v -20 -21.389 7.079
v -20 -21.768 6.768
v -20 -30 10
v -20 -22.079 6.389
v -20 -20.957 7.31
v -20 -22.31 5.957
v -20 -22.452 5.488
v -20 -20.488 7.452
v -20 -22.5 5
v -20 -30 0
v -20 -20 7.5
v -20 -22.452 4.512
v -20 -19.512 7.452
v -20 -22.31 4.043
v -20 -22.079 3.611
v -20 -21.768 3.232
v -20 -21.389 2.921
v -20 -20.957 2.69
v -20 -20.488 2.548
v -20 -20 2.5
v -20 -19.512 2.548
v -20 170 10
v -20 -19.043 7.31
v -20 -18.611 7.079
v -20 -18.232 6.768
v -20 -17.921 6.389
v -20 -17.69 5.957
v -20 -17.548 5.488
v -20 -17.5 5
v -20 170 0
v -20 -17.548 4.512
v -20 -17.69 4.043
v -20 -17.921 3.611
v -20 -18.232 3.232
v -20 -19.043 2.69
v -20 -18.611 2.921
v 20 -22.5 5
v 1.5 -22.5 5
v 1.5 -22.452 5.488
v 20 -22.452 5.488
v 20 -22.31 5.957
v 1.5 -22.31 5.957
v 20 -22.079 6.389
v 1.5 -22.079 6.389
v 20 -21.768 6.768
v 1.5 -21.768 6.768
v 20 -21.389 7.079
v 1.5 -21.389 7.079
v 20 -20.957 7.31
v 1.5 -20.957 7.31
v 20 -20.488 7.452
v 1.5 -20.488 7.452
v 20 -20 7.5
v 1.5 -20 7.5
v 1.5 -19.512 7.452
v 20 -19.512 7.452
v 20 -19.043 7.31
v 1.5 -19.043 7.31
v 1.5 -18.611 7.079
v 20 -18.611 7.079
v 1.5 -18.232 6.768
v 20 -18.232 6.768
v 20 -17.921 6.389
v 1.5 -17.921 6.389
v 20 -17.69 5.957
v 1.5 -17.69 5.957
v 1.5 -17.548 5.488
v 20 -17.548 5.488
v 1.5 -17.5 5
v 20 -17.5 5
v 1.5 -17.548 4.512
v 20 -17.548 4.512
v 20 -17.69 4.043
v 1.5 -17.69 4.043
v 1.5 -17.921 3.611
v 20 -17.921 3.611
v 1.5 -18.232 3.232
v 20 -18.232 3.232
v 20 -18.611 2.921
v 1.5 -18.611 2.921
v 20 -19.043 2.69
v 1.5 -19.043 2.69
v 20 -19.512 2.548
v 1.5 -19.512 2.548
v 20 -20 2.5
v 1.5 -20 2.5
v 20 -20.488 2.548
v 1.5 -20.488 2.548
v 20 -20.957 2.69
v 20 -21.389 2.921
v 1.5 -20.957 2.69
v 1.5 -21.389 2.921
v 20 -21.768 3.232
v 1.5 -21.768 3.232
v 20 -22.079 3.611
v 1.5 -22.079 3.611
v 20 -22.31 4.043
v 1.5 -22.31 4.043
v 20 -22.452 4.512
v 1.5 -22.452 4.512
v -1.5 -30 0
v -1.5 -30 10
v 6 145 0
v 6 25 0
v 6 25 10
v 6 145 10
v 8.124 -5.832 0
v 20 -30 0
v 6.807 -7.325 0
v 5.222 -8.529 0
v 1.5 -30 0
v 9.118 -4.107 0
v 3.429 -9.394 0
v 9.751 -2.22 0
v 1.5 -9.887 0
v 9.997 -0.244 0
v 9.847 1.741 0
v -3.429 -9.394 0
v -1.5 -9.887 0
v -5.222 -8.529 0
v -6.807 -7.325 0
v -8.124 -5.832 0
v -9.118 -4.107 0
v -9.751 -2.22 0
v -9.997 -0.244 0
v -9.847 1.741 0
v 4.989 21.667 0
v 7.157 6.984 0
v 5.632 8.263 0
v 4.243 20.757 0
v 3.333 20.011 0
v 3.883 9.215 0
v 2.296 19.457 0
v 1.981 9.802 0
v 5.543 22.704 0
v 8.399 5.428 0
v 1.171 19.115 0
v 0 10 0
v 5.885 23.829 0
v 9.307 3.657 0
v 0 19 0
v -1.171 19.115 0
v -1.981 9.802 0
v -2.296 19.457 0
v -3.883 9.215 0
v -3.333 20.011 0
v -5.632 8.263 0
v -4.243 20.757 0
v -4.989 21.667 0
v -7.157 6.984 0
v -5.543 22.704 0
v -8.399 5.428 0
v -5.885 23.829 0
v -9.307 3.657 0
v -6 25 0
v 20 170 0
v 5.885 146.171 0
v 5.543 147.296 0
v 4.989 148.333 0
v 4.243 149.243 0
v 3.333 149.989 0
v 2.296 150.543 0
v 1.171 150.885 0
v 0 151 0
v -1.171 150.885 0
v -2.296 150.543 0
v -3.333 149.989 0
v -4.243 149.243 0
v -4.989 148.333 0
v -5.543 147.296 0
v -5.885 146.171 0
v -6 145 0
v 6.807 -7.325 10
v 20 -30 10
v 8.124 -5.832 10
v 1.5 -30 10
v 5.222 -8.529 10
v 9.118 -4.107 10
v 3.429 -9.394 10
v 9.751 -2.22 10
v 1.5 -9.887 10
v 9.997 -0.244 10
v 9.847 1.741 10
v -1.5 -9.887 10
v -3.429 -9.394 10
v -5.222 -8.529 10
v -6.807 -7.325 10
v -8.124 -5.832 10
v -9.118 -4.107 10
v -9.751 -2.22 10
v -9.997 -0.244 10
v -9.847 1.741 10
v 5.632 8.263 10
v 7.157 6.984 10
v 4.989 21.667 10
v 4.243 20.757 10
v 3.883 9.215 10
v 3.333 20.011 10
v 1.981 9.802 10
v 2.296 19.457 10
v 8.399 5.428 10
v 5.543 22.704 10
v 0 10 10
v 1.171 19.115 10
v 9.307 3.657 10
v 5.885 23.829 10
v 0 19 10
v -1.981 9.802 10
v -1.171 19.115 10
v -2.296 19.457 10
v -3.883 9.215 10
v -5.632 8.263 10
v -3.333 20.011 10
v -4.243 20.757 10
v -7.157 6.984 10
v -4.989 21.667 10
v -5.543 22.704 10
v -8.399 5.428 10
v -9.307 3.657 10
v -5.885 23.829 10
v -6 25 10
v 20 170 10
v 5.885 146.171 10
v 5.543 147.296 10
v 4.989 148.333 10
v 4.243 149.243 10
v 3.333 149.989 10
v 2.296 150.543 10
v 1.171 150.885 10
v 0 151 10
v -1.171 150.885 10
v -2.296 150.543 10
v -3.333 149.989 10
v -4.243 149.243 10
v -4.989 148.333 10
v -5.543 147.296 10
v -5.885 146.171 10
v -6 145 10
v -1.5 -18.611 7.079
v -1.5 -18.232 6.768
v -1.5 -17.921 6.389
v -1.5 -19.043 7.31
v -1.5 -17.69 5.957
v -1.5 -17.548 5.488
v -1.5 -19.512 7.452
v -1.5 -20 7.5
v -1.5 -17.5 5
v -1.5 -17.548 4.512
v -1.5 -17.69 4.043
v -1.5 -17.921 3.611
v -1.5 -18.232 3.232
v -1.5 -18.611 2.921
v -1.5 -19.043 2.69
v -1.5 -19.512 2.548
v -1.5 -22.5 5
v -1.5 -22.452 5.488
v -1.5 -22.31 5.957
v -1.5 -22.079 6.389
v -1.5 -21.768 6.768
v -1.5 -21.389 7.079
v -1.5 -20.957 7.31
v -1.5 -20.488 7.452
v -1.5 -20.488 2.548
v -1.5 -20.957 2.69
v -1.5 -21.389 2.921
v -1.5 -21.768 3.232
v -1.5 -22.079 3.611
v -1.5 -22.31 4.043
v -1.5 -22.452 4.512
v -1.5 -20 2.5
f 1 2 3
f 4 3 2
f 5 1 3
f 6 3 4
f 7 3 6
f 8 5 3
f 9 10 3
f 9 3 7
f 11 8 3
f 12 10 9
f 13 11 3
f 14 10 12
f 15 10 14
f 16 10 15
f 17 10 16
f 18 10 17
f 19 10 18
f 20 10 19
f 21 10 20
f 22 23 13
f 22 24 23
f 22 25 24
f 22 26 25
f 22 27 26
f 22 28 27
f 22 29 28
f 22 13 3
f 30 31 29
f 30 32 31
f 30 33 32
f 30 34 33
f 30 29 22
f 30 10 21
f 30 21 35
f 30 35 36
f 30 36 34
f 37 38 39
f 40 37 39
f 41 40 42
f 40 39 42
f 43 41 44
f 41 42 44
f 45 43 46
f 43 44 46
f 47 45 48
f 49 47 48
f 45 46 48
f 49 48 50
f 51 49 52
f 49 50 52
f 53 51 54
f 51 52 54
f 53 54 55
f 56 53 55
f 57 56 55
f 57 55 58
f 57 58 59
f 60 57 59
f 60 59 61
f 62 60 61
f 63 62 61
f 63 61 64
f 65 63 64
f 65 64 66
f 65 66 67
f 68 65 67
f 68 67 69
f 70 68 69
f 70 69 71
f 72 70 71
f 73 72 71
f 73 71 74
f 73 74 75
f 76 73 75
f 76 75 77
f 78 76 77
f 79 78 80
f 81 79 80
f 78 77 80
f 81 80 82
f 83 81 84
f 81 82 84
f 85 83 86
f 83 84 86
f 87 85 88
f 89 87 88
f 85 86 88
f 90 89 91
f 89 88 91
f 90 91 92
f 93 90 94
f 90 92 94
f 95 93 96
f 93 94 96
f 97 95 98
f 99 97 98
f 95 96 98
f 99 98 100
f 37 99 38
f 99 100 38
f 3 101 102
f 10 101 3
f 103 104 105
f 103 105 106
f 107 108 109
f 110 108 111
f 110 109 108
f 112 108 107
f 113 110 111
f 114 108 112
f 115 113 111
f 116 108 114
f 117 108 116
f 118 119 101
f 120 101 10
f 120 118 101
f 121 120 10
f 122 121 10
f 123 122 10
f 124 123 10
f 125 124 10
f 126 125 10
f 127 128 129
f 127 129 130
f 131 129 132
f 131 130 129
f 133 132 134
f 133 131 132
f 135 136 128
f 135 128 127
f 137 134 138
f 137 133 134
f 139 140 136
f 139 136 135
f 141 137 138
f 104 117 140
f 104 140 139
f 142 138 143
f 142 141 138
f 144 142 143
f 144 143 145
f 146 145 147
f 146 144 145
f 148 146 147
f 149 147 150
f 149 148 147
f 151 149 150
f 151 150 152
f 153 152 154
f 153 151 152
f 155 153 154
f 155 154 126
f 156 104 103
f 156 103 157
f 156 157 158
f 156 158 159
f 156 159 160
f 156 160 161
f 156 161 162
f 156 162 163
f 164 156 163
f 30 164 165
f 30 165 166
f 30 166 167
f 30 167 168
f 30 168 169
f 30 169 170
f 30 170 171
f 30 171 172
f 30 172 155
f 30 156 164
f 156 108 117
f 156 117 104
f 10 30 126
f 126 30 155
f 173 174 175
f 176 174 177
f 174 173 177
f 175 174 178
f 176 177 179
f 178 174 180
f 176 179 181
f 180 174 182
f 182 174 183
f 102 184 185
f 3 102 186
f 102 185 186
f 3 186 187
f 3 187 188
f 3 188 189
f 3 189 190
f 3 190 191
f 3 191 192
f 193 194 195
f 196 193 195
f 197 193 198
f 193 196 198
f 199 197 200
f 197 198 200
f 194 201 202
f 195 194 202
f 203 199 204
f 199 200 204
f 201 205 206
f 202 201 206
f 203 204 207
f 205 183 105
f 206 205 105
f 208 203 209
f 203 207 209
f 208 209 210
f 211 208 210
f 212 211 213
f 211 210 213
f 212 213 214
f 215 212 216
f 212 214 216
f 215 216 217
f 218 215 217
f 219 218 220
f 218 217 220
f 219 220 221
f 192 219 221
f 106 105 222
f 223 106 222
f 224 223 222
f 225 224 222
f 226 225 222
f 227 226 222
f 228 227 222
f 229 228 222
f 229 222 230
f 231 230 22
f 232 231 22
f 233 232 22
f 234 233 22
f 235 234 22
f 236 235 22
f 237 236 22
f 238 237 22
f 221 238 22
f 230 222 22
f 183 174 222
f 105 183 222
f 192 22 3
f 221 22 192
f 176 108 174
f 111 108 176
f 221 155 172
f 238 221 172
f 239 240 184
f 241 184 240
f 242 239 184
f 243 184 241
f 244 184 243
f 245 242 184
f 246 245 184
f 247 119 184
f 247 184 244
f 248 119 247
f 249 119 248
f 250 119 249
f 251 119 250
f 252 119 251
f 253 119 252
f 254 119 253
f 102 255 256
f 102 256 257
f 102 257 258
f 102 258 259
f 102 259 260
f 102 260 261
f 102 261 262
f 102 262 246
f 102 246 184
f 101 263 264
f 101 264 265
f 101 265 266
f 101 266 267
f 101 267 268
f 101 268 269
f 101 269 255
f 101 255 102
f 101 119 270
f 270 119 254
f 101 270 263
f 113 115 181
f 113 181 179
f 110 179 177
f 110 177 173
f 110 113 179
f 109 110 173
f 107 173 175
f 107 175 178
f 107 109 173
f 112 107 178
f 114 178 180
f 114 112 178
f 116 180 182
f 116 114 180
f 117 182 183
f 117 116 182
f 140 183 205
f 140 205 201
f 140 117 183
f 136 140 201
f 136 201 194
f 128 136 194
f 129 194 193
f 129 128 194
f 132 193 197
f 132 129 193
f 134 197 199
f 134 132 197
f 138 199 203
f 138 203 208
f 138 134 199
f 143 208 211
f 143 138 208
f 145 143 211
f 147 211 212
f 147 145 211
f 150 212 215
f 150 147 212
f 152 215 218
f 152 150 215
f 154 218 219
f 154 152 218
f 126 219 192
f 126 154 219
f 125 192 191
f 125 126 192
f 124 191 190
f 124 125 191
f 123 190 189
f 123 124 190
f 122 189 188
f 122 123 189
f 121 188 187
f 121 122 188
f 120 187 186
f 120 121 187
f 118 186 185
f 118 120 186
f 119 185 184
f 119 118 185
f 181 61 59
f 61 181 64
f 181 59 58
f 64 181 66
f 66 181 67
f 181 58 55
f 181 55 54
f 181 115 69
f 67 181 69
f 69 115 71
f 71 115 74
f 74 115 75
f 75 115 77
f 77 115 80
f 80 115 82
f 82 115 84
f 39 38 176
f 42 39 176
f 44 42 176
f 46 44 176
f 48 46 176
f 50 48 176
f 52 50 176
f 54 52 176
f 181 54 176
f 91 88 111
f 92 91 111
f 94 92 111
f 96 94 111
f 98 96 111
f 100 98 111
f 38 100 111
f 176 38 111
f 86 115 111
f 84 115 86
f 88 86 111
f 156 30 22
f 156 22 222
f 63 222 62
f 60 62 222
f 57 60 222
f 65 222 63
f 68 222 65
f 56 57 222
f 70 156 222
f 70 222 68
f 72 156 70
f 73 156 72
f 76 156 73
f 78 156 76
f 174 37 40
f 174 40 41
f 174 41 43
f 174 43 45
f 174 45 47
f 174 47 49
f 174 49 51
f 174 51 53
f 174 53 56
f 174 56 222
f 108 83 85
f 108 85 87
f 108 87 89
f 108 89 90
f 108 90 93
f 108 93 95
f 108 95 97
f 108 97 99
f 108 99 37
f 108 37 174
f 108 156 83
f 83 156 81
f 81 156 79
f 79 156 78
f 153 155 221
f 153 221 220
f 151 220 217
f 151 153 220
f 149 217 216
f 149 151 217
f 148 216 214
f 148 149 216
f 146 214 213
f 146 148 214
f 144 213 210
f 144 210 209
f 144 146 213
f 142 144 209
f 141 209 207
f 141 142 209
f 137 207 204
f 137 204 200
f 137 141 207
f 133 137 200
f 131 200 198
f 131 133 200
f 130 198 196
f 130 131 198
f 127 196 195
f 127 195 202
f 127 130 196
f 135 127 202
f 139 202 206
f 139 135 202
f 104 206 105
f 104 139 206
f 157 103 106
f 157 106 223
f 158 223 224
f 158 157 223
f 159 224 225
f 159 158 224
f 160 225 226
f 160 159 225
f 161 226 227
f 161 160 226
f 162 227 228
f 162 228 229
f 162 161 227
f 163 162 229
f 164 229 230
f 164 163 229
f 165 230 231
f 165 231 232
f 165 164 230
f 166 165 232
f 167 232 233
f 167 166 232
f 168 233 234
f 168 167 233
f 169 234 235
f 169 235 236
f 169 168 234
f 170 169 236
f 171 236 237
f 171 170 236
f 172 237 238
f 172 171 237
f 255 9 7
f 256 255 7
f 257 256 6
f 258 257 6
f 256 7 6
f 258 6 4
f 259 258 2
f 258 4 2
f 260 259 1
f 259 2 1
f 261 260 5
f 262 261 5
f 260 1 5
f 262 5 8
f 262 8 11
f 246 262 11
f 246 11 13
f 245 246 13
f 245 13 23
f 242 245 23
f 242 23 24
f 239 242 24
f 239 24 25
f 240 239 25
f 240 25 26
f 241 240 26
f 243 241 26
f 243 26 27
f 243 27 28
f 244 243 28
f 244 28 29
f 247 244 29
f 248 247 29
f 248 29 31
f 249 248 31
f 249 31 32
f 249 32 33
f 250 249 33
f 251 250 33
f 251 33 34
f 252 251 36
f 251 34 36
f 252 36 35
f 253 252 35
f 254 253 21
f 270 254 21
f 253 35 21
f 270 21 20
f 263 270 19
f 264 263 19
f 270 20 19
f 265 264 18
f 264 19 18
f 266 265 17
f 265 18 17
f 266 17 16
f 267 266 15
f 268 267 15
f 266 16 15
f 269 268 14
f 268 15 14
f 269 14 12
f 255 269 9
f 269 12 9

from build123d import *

# Parameters (mm, degrees)
PAD_DEPTH    = 10
SKETCH001_R  = 2.5
POCKET_DEPTH = 40.001


with BuildPart() as part:
    # Sketch → Pad (new body)
    with BuildSketch(Plane.XY):
        with BuildLine():
            Line((-20, 170), (20, 170))
            Line((20, 170), (20, -30))
            Line((20, -30), (1.5, -30))
            Line((1.5, -9.88686), (1.5, -30))
            ThreePointArc((1.5, -9.88686), (0, 10), (-1.5, -9.88686))
            Line((-1.5, -9.88686), (-1.5, -30))
            Line((-1.5, -30), (-20, -30))
            Line((-20, -30), (-20, 170))
        make_face()
        with BuildLine():
            ThreePointArc((6, 145), (0, 151), (-6, 145))
            Line((-6, 25), (-6, 145))
            ThreePointArc((-6, 25), (0, 19), (6, 25))
            Line((6, 25), (6, 145))
        make_face(mode=Mode.SUBTRACT)
    extrude(amount=PAD_DEPTH)

    # Sketch001 (on Face8 of Pad) → Pocket (cut, through all)
    with BuildSketch(Plane(origin=(-20, 0, 0), x_dir=(0, -1, 0), z_dir=(-1, 0, 0))):
        with Locations((20, 5)):
            Circle(SKETCH001_R)
    extrude(amount=-POCKET_DEPTH, mode=Mode.SUBTRACT)


solid = part.part
